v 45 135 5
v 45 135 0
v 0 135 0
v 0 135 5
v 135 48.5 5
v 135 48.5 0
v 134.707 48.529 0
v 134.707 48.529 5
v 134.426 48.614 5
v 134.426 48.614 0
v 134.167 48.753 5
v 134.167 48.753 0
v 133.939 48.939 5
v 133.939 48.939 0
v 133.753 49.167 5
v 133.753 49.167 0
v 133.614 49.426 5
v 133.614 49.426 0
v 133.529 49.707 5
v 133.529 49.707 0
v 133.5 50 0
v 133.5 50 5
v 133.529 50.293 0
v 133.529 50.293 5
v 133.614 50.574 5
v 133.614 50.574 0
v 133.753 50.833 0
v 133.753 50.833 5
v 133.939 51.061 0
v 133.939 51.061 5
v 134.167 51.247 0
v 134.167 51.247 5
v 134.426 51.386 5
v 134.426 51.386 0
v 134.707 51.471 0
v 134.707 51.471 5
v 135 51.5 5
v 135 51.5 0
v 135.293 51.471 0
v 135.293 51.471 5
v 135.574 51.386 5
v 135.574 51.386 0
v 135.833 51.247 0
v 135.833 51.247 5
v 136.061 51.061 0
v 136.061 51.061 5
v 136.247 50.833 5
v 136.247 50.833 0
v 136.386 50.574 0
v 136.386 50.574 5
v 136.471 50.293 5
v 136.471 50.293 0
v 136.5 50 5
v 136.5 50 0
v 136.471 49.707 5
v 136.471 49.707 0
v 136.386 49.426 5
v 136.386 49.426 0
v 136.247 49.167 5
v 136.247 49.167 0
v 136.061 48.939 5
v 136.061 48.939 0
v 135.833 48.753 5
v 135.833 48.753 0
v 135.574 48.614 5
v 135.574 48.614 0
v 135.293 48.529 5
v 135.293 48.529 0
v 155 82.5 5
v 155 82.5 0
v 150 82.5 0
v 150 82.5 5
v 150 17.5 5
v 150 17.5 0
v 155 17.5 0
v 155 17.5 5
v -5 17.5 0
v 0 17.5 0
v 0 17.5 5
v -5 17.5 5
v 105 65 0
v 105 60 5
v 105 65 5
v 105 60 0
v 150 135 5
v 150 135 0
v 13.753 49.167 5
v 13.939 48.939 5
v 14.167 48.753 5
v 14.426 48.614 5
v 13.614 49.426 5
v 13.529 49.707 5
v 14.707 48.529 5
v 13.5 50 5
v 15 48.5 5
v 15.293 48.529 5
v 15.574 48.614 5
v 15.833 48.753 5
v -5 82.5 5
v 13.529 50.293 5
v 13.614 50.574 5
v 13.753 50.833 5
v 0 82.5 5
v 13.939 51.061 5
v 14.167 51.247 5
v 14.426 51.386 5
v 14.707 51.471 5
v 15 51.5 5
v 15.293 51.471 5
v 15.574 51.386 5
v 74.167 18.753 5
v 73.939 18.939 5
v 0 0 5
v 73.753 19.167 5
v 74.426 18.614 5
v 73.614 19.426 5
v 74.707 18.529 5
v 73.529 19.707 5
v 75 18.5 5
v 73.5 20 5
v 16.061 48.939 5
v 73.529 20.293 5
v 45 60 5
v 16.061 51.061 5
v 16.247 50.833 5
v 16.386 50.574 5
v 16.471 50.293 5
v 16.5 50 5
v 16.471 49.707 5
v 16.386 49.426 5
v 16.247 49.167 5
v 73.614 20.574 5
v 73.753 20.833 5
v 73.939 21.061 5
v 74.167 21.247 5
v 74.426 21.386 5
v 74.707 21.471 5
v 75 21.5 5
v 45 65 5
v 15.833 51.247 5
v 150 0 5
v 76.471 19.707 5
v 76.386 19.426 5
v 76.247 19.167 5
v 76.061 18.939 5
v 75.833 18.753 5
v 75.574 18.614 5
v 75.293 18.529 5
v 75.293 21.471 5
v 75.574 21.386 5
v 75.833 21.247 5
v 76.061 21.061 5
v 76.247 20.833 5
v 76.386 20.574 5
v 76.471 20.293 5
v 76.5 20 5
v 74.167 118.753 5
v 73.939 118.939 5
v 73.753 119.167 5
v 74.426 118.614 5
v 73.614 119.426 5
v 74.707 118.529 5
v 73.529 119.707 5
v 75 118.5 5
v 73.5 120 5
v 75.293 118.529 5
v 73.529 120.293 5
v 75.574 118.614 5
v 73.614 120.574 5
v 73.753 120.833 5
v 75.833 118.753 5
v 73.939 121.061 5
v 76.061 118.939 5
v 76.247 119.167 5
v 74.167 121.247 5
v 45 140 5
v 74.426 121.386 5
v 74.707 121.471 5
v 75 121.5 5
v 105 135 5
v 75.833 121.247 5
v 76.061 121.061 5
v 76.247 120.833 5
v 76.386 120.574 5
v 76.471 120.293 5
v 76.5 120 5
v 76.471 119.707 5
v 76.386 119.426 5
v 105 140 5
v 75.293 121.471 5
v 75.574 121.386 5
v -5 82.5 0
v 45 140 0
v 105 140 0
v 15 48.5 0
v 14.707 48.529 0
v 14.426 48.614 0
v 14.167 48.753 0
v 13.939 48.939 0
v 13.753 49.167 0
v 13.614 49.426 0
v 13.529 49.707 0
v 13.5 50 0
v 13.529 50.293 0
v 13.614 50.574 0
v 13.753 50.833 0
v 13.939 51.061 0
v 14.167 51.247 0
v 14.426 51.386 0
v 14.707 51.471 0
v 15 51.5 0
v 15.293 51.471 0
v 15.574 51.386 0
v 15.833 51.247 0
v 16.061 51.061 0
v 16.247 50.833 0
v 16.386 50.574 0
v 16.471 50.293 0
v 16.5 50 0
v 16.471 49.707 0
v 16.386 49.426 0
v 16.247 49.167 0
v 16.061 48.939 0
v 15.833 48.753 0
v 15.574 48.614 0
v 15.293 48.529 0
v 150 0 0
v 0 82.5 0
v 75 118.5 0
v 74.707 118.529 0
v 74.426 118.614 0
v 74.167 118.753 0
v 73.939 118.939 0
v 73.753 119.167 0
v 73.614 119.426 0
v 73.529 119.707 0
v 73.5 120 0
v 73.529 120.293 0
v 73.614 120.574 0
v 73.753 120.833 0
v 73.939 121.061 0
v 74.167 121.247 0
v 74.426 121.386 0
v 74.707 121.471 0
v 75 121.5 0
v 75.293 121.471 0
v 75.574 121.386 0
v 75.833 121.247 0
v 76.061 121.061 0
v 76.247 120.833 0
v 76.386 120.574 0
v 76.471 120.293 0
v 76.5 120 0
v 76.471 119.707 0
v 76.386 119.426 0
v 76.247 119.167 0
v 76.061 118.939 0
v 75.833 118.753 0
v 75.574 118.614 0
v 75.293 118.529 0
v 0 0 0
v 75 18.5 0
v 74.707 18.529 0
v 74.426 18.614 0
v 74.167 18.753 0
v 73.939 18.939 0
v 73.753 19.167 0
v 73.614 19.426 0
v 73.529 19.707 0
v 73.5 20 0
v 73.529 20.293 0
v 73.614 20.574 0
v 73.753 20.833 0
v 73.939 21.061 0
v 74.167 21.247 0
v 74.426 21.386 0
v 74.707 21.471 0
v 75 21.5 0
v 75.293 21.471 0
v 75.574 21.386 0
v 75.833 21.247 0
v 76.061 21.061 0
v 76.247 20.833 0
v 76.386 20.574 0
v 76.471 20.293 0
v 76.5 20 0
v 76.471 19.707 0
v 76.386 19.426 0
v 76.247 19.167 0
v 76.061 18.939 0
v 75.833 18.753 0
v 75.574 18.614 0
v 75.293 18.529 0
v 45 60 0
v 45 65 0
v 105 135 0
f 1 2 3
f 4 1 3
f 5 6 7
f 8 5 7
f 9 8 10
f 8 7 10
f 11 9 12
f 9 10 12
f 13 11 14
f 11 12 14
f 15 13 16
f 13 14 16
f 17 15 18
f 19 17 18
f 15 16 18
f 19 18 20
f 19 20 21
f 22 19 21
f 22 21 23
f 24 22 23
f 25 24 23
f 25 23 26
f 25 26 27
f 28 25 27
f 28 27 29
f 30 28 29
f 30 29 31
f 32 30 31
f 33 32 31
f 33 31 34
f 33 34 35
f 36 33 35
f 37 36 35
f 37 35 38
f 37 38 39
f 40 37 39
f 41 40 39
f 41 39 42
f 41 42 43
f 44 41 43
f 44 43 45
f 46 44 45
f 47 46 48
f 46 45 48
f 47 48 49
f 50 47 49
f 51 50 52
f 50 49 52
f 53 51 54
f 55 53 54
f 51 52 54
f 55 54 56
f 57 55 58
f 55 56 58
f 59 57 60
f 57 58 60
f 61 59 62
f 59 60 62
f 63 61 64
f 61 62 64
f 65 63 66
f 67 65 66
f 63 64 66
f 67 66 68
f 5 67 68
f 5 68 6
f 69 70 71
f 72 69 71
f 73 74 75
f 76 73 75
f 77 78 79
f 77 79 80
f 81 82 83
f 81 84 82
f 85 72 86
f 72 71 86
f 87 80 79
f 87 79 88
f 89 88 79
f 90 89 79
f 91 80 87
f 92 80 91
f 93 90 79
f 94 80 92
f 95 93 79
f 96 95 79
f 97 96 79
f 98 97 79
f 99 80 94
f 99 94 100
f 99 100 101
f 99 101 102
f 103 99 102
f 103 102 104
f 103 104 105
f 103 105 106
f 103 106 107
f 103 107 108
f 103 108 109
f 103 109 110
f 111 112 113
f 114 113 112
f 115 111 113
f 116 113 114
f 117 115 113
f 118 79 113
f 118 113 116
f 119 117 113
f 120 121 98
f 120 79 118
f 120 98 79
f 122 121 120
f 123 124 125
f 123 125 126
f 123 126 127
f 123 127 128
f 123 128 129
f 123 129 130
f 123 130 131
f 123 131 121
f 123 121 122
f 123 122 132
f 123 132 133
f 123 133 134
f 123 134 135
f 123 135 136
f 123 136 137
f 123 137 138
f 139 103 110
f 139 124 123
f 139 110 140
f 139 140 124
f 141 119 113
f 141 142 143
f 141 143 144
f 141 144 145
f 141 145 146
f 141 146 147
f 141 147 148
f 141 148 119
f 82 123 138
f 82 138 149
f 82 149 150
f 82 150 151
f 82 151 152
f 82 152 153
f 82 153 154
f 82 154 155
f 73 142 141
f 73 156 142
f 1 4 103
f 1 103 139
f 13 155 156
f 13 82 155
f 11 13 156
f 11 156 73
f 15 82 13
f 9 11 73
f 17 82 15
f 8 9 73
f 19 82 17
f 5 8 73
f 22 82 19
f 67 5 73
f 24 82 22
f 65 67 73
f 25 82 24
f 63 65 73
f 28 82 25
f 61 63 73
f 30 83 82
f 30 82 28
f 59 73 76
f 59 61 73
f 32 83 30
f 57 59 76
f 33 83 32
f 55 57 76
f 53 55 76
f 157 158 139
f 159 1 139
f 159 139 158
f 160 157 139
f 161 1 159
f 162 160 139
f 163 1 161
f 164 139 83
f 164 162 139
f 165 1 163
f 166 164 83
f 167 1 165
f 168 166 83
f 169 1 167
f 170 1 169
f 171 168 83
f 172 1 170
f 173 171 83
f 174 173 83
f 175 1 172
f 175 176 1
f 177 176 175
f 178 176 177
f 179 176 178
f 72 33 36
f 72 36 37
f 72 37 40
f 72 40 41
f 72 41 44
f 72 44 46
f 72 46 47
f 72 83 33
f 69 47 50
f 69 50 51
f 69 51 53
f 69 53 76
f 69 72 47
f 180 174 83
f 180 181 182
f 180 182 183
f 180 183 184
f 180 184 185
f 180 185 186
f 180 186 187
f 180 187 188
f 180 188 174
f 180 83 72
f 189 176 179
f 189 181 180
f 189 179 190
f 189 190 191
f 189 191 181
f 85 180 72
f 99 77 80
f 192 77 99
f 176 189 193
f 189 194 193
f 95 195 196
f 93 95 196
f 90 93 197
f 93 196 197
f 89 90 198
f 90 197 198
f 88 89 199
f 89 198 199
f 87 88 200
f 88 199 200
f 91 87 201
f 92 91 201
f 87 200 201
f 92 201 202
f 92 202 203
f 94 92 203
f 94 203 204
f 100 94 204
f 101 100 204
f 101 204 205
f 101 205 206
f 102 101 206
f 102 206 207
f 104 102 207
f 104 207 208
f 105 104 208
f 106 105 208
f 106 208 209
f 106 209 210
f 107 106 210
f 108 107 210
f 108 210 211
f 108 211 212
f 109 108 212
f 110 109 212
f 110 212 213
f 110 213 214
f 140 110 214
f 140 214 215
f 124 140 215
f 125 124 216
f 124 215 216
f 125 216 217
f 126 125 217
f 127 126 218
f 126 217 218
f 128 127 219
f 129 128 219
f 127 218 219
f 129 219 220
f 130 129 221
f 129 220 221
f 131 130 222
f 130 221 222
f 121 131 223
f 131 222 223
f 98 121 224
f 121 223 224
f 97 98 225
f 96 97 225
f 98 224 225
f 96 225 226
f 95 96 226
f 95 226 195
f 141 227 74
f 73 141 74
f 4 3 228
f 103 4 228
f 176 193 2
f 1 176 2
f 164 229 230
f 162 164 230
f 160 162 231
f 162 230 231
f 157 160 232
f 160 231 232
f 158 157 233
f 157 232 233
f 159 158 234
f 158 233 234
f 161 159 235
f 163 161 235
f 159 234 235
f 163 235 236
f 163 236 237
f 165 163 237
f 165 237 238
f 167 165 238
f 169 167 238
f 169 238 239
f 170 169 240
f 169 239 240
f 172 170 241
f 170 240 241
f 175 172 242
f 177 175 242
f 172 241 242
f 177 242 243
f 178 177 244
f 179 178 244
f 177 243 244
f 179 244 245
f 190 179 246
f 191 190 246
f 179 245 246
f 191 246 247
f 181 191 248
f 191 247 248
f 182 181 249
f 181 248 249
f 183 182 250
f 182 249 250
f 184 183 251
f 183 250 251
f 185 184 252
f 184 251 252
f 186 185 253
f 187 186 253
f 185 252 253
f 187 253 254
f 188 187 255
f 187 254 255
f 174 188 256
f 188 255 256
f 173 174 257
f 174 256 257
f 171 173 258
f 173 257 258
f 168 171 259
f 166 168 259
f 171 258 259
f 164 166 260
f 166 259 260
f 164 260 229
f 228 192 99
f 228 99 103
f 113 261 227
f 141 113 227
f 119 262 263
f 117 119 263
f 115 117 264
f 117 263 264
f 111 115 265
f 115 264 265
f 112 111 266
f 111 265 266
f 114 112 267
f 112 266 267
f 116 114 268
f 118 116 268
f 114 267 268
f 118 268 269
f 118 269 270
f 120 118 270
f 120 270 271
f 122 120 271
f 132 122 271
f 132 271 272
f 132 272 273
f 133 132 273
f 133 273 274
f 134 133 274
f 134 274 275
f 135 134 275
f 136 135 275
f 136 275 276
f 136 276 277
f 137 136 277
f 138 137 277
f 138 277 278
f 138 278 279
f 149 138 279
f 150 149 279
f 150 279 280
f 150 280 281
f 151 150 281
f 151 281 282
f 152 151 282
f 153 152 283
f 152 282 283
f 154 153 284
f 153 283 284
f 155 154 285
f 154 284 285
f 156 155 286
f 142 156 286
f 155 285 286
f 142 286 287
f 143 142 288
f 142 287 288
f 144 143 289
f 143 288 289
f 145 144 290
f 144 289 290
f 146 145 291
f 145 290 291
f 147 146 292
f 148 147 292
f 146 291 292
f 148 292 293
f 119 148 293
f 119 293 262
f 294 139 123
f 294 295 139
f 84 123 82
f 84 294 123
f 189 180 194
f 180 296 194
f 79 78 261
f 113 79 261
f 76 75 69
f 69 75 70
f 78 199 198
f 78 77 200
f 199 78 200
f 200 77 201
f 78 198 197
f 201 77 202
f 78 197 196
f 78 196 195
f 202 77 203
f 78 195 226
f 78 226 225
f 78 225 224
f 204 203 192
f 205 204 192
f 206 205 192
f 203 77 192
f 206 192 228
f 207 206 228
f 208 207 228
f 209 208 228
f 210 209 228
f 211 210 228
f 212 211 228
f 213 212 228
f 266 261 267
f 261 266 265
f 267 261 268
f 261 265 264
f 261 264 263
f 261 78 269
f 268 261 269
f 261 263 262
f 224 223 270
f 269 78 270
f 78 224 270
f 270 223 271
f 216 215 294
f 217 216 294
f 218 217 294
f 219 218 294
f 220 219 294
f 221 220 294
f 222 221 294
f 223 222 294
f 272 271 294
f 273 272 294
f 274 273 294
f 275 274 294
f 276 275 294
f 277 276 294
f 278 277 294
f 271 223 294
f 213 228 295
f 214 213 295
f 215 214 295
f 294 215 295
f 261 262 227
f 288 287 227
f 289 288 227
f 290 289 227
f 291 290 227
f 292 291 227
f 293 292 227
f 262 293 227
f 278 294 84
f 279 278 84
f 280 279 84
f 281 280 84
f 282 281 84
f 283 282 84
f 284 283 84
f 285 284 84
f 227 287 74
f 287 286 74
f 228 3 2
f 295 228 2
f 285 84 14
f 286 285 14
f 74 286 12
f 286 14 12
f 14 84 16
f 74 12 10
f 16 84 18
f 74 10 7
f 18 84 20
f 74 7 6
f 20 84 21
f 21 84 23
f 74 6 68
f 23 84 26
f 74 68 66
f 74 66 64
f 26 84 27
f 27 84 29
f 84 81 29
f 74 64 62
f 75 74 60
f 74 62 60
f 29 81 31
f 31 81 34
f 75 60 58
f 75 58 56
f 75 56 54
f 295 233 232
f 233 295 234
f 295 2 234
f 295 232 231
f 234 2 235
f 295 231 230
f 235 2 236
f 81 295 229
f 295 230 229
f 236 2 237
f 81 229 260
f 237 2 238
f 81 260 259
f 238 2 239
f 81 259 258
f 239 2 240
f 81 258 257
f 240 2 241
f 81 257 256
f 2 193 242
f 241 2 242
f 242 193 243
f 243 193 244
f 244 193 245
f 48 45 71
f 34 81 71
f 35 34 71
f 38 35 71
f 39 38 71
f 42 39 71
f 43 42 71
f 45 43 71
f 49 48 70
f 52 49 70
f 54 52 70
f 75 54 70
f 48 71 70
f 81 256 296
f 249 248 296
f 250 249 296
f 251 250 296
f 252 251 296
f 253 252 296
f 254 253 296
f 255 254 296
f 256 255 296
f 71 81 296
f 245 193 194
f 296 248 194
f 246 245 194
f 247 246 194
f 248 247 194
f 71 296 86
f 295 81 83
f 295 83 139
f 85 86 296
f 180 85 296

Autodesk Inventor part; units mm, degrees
ref_plane "YZ Plane" through (0, 0, 0) normal (1, 0, 0) x (0, 1, 0)
ref_plane "XZ Plane" through (0, 0, 0) normal (0, 1, 0) x (-1, 0, 0)
ref_plane "XY Plane" through (0, 0, 0) normal (0, 0, 1) x (1, 0, 0)
sketch "Sketch1" plane through (0, 0, 0) normal (0, 0, 1) x (1, 0, 0)
  line L0 (0, 0) -> (150, 0)
  line L1 (150, 0) -> (150, 135)
  line L2 (150, 135) -> (0, 135)
  line L3 (0, 135) -> (0, 0)
  line L4 (0, 17.5) -> (-5, 17.5)
  line L5 (-5, 17.5) -> (-5, 82.5)
  line L6 (-5, 82.5) -> (0, 82.5)
  line L7 (0, 82.5) -> (0, 17.5)
  line L8 (75, 0) -> (75, 135) construction
  line L9 (150, 17.5) -> (155, 17.5)
  line L10 (155, 17.5) -> (155, 82.5)
  line L11 (155, 82.5) -> (150, 82.5)
  line L12 (150, 82.5) -> (150, 17.5)
  line L13 (45, 60) -> (105, 60)
  line L14 (105, 60) -> (105, 65)
  line L15 (105, 65) -> (45, 65)
  line L16 (45, 65) -> (45, 60)
  line L17 (0, 50) -> (150, 50) construction
  line L18 (45, 135) -> (105, 135)
  line L19 (105, 135) -> (105, 140)
  line L20 (105, 140) -> (45, 140)
  line L21 (45, 140) -> (45, 135)
  point P0 (150, 17.5)
  point P1 (150, 82.5)
  point P2 (0, 82.5)
  point P3 (10, 0)
  point P4 (45, 62.5)
  dimension "d0" = 150
  dimension "d1" = 135
  dimension "d2" = 5
  dimension "d3" = 65
  dimension "d6" = 60
  dimension "d7" = 5
  dimension "d14" = 30
  dimension "d30" = 60
  dimension "d31" = 5
  dimension "d32" = 45
  dimension "d58" = 52.5
  dimension "d59" = 60
extrude "Extrusion1" add sketch "Sketch1" along normal blind 5
sketch "Sketch2" plane through (0, 0, 5) normal (0, 0, 1) x (1, 0, 0)
  line L0 (150, 135) -> (0, 135) projected
  line L1 (0, 0) -> (150, 0) projected
  line L2 (0, 135) -> (0, 82.5) projected
  line L3 (0, 17.5) -> (0, 0) projected
  point P0 (75, 20)
  dimension "d24" = 20
  dimension "d29" = 75
hole "Hole1" at (75, 20, 5) direction (0, 0, -1) diameter 3 end through all
sketch "Sketch3" plane through (0, 0, 5) normal (0, 0, 1) x (1, 0, 0)
  line L0 (105, 140) -> (45, 140) projected
  line L1 (45, 140) -> (45, 135) projected
  line L2 (0, 135) -> (0, 82.5) projected
  point P0 (0, 0)
  point P1 (75, 120)
  dimension "d40" = 20
  dimension "d45" = 75
hole "Hole2" at (75, 120, 5) direction (0, 0, -1) diameter 3 end through all
sketch "Sketch4" plane through (0, 0, 5) normal (0, 0, 1) x (1, 0, 0)
  line L0 (-5, 82.5) -> (-5, 17.5) projected
  line L1 (0, 82.5) -> (-5, 82.5) projected
  line L2 (155, 82.5) -> (150, 82.5) projected
  line L3 (155, 17.5) -> (155, 82.5) projected
  point P0 (0, 0)
  point P1 (135, 50)
  point P2 (15, 50)
  point P3 (-5, 50)
  point P4 (-2.5, 82.5)
  dimension "d54" = 20
  dimension "d55" = 32.5
  dimension "d56" = 32.5
  dimension "d57" = 20
hole "Hole3" at (135, 50, 5) at (15, 50, 5) direction (0, 0, -1) diameter 3 end through all
properties part number "back" material "ABS Plastic"
